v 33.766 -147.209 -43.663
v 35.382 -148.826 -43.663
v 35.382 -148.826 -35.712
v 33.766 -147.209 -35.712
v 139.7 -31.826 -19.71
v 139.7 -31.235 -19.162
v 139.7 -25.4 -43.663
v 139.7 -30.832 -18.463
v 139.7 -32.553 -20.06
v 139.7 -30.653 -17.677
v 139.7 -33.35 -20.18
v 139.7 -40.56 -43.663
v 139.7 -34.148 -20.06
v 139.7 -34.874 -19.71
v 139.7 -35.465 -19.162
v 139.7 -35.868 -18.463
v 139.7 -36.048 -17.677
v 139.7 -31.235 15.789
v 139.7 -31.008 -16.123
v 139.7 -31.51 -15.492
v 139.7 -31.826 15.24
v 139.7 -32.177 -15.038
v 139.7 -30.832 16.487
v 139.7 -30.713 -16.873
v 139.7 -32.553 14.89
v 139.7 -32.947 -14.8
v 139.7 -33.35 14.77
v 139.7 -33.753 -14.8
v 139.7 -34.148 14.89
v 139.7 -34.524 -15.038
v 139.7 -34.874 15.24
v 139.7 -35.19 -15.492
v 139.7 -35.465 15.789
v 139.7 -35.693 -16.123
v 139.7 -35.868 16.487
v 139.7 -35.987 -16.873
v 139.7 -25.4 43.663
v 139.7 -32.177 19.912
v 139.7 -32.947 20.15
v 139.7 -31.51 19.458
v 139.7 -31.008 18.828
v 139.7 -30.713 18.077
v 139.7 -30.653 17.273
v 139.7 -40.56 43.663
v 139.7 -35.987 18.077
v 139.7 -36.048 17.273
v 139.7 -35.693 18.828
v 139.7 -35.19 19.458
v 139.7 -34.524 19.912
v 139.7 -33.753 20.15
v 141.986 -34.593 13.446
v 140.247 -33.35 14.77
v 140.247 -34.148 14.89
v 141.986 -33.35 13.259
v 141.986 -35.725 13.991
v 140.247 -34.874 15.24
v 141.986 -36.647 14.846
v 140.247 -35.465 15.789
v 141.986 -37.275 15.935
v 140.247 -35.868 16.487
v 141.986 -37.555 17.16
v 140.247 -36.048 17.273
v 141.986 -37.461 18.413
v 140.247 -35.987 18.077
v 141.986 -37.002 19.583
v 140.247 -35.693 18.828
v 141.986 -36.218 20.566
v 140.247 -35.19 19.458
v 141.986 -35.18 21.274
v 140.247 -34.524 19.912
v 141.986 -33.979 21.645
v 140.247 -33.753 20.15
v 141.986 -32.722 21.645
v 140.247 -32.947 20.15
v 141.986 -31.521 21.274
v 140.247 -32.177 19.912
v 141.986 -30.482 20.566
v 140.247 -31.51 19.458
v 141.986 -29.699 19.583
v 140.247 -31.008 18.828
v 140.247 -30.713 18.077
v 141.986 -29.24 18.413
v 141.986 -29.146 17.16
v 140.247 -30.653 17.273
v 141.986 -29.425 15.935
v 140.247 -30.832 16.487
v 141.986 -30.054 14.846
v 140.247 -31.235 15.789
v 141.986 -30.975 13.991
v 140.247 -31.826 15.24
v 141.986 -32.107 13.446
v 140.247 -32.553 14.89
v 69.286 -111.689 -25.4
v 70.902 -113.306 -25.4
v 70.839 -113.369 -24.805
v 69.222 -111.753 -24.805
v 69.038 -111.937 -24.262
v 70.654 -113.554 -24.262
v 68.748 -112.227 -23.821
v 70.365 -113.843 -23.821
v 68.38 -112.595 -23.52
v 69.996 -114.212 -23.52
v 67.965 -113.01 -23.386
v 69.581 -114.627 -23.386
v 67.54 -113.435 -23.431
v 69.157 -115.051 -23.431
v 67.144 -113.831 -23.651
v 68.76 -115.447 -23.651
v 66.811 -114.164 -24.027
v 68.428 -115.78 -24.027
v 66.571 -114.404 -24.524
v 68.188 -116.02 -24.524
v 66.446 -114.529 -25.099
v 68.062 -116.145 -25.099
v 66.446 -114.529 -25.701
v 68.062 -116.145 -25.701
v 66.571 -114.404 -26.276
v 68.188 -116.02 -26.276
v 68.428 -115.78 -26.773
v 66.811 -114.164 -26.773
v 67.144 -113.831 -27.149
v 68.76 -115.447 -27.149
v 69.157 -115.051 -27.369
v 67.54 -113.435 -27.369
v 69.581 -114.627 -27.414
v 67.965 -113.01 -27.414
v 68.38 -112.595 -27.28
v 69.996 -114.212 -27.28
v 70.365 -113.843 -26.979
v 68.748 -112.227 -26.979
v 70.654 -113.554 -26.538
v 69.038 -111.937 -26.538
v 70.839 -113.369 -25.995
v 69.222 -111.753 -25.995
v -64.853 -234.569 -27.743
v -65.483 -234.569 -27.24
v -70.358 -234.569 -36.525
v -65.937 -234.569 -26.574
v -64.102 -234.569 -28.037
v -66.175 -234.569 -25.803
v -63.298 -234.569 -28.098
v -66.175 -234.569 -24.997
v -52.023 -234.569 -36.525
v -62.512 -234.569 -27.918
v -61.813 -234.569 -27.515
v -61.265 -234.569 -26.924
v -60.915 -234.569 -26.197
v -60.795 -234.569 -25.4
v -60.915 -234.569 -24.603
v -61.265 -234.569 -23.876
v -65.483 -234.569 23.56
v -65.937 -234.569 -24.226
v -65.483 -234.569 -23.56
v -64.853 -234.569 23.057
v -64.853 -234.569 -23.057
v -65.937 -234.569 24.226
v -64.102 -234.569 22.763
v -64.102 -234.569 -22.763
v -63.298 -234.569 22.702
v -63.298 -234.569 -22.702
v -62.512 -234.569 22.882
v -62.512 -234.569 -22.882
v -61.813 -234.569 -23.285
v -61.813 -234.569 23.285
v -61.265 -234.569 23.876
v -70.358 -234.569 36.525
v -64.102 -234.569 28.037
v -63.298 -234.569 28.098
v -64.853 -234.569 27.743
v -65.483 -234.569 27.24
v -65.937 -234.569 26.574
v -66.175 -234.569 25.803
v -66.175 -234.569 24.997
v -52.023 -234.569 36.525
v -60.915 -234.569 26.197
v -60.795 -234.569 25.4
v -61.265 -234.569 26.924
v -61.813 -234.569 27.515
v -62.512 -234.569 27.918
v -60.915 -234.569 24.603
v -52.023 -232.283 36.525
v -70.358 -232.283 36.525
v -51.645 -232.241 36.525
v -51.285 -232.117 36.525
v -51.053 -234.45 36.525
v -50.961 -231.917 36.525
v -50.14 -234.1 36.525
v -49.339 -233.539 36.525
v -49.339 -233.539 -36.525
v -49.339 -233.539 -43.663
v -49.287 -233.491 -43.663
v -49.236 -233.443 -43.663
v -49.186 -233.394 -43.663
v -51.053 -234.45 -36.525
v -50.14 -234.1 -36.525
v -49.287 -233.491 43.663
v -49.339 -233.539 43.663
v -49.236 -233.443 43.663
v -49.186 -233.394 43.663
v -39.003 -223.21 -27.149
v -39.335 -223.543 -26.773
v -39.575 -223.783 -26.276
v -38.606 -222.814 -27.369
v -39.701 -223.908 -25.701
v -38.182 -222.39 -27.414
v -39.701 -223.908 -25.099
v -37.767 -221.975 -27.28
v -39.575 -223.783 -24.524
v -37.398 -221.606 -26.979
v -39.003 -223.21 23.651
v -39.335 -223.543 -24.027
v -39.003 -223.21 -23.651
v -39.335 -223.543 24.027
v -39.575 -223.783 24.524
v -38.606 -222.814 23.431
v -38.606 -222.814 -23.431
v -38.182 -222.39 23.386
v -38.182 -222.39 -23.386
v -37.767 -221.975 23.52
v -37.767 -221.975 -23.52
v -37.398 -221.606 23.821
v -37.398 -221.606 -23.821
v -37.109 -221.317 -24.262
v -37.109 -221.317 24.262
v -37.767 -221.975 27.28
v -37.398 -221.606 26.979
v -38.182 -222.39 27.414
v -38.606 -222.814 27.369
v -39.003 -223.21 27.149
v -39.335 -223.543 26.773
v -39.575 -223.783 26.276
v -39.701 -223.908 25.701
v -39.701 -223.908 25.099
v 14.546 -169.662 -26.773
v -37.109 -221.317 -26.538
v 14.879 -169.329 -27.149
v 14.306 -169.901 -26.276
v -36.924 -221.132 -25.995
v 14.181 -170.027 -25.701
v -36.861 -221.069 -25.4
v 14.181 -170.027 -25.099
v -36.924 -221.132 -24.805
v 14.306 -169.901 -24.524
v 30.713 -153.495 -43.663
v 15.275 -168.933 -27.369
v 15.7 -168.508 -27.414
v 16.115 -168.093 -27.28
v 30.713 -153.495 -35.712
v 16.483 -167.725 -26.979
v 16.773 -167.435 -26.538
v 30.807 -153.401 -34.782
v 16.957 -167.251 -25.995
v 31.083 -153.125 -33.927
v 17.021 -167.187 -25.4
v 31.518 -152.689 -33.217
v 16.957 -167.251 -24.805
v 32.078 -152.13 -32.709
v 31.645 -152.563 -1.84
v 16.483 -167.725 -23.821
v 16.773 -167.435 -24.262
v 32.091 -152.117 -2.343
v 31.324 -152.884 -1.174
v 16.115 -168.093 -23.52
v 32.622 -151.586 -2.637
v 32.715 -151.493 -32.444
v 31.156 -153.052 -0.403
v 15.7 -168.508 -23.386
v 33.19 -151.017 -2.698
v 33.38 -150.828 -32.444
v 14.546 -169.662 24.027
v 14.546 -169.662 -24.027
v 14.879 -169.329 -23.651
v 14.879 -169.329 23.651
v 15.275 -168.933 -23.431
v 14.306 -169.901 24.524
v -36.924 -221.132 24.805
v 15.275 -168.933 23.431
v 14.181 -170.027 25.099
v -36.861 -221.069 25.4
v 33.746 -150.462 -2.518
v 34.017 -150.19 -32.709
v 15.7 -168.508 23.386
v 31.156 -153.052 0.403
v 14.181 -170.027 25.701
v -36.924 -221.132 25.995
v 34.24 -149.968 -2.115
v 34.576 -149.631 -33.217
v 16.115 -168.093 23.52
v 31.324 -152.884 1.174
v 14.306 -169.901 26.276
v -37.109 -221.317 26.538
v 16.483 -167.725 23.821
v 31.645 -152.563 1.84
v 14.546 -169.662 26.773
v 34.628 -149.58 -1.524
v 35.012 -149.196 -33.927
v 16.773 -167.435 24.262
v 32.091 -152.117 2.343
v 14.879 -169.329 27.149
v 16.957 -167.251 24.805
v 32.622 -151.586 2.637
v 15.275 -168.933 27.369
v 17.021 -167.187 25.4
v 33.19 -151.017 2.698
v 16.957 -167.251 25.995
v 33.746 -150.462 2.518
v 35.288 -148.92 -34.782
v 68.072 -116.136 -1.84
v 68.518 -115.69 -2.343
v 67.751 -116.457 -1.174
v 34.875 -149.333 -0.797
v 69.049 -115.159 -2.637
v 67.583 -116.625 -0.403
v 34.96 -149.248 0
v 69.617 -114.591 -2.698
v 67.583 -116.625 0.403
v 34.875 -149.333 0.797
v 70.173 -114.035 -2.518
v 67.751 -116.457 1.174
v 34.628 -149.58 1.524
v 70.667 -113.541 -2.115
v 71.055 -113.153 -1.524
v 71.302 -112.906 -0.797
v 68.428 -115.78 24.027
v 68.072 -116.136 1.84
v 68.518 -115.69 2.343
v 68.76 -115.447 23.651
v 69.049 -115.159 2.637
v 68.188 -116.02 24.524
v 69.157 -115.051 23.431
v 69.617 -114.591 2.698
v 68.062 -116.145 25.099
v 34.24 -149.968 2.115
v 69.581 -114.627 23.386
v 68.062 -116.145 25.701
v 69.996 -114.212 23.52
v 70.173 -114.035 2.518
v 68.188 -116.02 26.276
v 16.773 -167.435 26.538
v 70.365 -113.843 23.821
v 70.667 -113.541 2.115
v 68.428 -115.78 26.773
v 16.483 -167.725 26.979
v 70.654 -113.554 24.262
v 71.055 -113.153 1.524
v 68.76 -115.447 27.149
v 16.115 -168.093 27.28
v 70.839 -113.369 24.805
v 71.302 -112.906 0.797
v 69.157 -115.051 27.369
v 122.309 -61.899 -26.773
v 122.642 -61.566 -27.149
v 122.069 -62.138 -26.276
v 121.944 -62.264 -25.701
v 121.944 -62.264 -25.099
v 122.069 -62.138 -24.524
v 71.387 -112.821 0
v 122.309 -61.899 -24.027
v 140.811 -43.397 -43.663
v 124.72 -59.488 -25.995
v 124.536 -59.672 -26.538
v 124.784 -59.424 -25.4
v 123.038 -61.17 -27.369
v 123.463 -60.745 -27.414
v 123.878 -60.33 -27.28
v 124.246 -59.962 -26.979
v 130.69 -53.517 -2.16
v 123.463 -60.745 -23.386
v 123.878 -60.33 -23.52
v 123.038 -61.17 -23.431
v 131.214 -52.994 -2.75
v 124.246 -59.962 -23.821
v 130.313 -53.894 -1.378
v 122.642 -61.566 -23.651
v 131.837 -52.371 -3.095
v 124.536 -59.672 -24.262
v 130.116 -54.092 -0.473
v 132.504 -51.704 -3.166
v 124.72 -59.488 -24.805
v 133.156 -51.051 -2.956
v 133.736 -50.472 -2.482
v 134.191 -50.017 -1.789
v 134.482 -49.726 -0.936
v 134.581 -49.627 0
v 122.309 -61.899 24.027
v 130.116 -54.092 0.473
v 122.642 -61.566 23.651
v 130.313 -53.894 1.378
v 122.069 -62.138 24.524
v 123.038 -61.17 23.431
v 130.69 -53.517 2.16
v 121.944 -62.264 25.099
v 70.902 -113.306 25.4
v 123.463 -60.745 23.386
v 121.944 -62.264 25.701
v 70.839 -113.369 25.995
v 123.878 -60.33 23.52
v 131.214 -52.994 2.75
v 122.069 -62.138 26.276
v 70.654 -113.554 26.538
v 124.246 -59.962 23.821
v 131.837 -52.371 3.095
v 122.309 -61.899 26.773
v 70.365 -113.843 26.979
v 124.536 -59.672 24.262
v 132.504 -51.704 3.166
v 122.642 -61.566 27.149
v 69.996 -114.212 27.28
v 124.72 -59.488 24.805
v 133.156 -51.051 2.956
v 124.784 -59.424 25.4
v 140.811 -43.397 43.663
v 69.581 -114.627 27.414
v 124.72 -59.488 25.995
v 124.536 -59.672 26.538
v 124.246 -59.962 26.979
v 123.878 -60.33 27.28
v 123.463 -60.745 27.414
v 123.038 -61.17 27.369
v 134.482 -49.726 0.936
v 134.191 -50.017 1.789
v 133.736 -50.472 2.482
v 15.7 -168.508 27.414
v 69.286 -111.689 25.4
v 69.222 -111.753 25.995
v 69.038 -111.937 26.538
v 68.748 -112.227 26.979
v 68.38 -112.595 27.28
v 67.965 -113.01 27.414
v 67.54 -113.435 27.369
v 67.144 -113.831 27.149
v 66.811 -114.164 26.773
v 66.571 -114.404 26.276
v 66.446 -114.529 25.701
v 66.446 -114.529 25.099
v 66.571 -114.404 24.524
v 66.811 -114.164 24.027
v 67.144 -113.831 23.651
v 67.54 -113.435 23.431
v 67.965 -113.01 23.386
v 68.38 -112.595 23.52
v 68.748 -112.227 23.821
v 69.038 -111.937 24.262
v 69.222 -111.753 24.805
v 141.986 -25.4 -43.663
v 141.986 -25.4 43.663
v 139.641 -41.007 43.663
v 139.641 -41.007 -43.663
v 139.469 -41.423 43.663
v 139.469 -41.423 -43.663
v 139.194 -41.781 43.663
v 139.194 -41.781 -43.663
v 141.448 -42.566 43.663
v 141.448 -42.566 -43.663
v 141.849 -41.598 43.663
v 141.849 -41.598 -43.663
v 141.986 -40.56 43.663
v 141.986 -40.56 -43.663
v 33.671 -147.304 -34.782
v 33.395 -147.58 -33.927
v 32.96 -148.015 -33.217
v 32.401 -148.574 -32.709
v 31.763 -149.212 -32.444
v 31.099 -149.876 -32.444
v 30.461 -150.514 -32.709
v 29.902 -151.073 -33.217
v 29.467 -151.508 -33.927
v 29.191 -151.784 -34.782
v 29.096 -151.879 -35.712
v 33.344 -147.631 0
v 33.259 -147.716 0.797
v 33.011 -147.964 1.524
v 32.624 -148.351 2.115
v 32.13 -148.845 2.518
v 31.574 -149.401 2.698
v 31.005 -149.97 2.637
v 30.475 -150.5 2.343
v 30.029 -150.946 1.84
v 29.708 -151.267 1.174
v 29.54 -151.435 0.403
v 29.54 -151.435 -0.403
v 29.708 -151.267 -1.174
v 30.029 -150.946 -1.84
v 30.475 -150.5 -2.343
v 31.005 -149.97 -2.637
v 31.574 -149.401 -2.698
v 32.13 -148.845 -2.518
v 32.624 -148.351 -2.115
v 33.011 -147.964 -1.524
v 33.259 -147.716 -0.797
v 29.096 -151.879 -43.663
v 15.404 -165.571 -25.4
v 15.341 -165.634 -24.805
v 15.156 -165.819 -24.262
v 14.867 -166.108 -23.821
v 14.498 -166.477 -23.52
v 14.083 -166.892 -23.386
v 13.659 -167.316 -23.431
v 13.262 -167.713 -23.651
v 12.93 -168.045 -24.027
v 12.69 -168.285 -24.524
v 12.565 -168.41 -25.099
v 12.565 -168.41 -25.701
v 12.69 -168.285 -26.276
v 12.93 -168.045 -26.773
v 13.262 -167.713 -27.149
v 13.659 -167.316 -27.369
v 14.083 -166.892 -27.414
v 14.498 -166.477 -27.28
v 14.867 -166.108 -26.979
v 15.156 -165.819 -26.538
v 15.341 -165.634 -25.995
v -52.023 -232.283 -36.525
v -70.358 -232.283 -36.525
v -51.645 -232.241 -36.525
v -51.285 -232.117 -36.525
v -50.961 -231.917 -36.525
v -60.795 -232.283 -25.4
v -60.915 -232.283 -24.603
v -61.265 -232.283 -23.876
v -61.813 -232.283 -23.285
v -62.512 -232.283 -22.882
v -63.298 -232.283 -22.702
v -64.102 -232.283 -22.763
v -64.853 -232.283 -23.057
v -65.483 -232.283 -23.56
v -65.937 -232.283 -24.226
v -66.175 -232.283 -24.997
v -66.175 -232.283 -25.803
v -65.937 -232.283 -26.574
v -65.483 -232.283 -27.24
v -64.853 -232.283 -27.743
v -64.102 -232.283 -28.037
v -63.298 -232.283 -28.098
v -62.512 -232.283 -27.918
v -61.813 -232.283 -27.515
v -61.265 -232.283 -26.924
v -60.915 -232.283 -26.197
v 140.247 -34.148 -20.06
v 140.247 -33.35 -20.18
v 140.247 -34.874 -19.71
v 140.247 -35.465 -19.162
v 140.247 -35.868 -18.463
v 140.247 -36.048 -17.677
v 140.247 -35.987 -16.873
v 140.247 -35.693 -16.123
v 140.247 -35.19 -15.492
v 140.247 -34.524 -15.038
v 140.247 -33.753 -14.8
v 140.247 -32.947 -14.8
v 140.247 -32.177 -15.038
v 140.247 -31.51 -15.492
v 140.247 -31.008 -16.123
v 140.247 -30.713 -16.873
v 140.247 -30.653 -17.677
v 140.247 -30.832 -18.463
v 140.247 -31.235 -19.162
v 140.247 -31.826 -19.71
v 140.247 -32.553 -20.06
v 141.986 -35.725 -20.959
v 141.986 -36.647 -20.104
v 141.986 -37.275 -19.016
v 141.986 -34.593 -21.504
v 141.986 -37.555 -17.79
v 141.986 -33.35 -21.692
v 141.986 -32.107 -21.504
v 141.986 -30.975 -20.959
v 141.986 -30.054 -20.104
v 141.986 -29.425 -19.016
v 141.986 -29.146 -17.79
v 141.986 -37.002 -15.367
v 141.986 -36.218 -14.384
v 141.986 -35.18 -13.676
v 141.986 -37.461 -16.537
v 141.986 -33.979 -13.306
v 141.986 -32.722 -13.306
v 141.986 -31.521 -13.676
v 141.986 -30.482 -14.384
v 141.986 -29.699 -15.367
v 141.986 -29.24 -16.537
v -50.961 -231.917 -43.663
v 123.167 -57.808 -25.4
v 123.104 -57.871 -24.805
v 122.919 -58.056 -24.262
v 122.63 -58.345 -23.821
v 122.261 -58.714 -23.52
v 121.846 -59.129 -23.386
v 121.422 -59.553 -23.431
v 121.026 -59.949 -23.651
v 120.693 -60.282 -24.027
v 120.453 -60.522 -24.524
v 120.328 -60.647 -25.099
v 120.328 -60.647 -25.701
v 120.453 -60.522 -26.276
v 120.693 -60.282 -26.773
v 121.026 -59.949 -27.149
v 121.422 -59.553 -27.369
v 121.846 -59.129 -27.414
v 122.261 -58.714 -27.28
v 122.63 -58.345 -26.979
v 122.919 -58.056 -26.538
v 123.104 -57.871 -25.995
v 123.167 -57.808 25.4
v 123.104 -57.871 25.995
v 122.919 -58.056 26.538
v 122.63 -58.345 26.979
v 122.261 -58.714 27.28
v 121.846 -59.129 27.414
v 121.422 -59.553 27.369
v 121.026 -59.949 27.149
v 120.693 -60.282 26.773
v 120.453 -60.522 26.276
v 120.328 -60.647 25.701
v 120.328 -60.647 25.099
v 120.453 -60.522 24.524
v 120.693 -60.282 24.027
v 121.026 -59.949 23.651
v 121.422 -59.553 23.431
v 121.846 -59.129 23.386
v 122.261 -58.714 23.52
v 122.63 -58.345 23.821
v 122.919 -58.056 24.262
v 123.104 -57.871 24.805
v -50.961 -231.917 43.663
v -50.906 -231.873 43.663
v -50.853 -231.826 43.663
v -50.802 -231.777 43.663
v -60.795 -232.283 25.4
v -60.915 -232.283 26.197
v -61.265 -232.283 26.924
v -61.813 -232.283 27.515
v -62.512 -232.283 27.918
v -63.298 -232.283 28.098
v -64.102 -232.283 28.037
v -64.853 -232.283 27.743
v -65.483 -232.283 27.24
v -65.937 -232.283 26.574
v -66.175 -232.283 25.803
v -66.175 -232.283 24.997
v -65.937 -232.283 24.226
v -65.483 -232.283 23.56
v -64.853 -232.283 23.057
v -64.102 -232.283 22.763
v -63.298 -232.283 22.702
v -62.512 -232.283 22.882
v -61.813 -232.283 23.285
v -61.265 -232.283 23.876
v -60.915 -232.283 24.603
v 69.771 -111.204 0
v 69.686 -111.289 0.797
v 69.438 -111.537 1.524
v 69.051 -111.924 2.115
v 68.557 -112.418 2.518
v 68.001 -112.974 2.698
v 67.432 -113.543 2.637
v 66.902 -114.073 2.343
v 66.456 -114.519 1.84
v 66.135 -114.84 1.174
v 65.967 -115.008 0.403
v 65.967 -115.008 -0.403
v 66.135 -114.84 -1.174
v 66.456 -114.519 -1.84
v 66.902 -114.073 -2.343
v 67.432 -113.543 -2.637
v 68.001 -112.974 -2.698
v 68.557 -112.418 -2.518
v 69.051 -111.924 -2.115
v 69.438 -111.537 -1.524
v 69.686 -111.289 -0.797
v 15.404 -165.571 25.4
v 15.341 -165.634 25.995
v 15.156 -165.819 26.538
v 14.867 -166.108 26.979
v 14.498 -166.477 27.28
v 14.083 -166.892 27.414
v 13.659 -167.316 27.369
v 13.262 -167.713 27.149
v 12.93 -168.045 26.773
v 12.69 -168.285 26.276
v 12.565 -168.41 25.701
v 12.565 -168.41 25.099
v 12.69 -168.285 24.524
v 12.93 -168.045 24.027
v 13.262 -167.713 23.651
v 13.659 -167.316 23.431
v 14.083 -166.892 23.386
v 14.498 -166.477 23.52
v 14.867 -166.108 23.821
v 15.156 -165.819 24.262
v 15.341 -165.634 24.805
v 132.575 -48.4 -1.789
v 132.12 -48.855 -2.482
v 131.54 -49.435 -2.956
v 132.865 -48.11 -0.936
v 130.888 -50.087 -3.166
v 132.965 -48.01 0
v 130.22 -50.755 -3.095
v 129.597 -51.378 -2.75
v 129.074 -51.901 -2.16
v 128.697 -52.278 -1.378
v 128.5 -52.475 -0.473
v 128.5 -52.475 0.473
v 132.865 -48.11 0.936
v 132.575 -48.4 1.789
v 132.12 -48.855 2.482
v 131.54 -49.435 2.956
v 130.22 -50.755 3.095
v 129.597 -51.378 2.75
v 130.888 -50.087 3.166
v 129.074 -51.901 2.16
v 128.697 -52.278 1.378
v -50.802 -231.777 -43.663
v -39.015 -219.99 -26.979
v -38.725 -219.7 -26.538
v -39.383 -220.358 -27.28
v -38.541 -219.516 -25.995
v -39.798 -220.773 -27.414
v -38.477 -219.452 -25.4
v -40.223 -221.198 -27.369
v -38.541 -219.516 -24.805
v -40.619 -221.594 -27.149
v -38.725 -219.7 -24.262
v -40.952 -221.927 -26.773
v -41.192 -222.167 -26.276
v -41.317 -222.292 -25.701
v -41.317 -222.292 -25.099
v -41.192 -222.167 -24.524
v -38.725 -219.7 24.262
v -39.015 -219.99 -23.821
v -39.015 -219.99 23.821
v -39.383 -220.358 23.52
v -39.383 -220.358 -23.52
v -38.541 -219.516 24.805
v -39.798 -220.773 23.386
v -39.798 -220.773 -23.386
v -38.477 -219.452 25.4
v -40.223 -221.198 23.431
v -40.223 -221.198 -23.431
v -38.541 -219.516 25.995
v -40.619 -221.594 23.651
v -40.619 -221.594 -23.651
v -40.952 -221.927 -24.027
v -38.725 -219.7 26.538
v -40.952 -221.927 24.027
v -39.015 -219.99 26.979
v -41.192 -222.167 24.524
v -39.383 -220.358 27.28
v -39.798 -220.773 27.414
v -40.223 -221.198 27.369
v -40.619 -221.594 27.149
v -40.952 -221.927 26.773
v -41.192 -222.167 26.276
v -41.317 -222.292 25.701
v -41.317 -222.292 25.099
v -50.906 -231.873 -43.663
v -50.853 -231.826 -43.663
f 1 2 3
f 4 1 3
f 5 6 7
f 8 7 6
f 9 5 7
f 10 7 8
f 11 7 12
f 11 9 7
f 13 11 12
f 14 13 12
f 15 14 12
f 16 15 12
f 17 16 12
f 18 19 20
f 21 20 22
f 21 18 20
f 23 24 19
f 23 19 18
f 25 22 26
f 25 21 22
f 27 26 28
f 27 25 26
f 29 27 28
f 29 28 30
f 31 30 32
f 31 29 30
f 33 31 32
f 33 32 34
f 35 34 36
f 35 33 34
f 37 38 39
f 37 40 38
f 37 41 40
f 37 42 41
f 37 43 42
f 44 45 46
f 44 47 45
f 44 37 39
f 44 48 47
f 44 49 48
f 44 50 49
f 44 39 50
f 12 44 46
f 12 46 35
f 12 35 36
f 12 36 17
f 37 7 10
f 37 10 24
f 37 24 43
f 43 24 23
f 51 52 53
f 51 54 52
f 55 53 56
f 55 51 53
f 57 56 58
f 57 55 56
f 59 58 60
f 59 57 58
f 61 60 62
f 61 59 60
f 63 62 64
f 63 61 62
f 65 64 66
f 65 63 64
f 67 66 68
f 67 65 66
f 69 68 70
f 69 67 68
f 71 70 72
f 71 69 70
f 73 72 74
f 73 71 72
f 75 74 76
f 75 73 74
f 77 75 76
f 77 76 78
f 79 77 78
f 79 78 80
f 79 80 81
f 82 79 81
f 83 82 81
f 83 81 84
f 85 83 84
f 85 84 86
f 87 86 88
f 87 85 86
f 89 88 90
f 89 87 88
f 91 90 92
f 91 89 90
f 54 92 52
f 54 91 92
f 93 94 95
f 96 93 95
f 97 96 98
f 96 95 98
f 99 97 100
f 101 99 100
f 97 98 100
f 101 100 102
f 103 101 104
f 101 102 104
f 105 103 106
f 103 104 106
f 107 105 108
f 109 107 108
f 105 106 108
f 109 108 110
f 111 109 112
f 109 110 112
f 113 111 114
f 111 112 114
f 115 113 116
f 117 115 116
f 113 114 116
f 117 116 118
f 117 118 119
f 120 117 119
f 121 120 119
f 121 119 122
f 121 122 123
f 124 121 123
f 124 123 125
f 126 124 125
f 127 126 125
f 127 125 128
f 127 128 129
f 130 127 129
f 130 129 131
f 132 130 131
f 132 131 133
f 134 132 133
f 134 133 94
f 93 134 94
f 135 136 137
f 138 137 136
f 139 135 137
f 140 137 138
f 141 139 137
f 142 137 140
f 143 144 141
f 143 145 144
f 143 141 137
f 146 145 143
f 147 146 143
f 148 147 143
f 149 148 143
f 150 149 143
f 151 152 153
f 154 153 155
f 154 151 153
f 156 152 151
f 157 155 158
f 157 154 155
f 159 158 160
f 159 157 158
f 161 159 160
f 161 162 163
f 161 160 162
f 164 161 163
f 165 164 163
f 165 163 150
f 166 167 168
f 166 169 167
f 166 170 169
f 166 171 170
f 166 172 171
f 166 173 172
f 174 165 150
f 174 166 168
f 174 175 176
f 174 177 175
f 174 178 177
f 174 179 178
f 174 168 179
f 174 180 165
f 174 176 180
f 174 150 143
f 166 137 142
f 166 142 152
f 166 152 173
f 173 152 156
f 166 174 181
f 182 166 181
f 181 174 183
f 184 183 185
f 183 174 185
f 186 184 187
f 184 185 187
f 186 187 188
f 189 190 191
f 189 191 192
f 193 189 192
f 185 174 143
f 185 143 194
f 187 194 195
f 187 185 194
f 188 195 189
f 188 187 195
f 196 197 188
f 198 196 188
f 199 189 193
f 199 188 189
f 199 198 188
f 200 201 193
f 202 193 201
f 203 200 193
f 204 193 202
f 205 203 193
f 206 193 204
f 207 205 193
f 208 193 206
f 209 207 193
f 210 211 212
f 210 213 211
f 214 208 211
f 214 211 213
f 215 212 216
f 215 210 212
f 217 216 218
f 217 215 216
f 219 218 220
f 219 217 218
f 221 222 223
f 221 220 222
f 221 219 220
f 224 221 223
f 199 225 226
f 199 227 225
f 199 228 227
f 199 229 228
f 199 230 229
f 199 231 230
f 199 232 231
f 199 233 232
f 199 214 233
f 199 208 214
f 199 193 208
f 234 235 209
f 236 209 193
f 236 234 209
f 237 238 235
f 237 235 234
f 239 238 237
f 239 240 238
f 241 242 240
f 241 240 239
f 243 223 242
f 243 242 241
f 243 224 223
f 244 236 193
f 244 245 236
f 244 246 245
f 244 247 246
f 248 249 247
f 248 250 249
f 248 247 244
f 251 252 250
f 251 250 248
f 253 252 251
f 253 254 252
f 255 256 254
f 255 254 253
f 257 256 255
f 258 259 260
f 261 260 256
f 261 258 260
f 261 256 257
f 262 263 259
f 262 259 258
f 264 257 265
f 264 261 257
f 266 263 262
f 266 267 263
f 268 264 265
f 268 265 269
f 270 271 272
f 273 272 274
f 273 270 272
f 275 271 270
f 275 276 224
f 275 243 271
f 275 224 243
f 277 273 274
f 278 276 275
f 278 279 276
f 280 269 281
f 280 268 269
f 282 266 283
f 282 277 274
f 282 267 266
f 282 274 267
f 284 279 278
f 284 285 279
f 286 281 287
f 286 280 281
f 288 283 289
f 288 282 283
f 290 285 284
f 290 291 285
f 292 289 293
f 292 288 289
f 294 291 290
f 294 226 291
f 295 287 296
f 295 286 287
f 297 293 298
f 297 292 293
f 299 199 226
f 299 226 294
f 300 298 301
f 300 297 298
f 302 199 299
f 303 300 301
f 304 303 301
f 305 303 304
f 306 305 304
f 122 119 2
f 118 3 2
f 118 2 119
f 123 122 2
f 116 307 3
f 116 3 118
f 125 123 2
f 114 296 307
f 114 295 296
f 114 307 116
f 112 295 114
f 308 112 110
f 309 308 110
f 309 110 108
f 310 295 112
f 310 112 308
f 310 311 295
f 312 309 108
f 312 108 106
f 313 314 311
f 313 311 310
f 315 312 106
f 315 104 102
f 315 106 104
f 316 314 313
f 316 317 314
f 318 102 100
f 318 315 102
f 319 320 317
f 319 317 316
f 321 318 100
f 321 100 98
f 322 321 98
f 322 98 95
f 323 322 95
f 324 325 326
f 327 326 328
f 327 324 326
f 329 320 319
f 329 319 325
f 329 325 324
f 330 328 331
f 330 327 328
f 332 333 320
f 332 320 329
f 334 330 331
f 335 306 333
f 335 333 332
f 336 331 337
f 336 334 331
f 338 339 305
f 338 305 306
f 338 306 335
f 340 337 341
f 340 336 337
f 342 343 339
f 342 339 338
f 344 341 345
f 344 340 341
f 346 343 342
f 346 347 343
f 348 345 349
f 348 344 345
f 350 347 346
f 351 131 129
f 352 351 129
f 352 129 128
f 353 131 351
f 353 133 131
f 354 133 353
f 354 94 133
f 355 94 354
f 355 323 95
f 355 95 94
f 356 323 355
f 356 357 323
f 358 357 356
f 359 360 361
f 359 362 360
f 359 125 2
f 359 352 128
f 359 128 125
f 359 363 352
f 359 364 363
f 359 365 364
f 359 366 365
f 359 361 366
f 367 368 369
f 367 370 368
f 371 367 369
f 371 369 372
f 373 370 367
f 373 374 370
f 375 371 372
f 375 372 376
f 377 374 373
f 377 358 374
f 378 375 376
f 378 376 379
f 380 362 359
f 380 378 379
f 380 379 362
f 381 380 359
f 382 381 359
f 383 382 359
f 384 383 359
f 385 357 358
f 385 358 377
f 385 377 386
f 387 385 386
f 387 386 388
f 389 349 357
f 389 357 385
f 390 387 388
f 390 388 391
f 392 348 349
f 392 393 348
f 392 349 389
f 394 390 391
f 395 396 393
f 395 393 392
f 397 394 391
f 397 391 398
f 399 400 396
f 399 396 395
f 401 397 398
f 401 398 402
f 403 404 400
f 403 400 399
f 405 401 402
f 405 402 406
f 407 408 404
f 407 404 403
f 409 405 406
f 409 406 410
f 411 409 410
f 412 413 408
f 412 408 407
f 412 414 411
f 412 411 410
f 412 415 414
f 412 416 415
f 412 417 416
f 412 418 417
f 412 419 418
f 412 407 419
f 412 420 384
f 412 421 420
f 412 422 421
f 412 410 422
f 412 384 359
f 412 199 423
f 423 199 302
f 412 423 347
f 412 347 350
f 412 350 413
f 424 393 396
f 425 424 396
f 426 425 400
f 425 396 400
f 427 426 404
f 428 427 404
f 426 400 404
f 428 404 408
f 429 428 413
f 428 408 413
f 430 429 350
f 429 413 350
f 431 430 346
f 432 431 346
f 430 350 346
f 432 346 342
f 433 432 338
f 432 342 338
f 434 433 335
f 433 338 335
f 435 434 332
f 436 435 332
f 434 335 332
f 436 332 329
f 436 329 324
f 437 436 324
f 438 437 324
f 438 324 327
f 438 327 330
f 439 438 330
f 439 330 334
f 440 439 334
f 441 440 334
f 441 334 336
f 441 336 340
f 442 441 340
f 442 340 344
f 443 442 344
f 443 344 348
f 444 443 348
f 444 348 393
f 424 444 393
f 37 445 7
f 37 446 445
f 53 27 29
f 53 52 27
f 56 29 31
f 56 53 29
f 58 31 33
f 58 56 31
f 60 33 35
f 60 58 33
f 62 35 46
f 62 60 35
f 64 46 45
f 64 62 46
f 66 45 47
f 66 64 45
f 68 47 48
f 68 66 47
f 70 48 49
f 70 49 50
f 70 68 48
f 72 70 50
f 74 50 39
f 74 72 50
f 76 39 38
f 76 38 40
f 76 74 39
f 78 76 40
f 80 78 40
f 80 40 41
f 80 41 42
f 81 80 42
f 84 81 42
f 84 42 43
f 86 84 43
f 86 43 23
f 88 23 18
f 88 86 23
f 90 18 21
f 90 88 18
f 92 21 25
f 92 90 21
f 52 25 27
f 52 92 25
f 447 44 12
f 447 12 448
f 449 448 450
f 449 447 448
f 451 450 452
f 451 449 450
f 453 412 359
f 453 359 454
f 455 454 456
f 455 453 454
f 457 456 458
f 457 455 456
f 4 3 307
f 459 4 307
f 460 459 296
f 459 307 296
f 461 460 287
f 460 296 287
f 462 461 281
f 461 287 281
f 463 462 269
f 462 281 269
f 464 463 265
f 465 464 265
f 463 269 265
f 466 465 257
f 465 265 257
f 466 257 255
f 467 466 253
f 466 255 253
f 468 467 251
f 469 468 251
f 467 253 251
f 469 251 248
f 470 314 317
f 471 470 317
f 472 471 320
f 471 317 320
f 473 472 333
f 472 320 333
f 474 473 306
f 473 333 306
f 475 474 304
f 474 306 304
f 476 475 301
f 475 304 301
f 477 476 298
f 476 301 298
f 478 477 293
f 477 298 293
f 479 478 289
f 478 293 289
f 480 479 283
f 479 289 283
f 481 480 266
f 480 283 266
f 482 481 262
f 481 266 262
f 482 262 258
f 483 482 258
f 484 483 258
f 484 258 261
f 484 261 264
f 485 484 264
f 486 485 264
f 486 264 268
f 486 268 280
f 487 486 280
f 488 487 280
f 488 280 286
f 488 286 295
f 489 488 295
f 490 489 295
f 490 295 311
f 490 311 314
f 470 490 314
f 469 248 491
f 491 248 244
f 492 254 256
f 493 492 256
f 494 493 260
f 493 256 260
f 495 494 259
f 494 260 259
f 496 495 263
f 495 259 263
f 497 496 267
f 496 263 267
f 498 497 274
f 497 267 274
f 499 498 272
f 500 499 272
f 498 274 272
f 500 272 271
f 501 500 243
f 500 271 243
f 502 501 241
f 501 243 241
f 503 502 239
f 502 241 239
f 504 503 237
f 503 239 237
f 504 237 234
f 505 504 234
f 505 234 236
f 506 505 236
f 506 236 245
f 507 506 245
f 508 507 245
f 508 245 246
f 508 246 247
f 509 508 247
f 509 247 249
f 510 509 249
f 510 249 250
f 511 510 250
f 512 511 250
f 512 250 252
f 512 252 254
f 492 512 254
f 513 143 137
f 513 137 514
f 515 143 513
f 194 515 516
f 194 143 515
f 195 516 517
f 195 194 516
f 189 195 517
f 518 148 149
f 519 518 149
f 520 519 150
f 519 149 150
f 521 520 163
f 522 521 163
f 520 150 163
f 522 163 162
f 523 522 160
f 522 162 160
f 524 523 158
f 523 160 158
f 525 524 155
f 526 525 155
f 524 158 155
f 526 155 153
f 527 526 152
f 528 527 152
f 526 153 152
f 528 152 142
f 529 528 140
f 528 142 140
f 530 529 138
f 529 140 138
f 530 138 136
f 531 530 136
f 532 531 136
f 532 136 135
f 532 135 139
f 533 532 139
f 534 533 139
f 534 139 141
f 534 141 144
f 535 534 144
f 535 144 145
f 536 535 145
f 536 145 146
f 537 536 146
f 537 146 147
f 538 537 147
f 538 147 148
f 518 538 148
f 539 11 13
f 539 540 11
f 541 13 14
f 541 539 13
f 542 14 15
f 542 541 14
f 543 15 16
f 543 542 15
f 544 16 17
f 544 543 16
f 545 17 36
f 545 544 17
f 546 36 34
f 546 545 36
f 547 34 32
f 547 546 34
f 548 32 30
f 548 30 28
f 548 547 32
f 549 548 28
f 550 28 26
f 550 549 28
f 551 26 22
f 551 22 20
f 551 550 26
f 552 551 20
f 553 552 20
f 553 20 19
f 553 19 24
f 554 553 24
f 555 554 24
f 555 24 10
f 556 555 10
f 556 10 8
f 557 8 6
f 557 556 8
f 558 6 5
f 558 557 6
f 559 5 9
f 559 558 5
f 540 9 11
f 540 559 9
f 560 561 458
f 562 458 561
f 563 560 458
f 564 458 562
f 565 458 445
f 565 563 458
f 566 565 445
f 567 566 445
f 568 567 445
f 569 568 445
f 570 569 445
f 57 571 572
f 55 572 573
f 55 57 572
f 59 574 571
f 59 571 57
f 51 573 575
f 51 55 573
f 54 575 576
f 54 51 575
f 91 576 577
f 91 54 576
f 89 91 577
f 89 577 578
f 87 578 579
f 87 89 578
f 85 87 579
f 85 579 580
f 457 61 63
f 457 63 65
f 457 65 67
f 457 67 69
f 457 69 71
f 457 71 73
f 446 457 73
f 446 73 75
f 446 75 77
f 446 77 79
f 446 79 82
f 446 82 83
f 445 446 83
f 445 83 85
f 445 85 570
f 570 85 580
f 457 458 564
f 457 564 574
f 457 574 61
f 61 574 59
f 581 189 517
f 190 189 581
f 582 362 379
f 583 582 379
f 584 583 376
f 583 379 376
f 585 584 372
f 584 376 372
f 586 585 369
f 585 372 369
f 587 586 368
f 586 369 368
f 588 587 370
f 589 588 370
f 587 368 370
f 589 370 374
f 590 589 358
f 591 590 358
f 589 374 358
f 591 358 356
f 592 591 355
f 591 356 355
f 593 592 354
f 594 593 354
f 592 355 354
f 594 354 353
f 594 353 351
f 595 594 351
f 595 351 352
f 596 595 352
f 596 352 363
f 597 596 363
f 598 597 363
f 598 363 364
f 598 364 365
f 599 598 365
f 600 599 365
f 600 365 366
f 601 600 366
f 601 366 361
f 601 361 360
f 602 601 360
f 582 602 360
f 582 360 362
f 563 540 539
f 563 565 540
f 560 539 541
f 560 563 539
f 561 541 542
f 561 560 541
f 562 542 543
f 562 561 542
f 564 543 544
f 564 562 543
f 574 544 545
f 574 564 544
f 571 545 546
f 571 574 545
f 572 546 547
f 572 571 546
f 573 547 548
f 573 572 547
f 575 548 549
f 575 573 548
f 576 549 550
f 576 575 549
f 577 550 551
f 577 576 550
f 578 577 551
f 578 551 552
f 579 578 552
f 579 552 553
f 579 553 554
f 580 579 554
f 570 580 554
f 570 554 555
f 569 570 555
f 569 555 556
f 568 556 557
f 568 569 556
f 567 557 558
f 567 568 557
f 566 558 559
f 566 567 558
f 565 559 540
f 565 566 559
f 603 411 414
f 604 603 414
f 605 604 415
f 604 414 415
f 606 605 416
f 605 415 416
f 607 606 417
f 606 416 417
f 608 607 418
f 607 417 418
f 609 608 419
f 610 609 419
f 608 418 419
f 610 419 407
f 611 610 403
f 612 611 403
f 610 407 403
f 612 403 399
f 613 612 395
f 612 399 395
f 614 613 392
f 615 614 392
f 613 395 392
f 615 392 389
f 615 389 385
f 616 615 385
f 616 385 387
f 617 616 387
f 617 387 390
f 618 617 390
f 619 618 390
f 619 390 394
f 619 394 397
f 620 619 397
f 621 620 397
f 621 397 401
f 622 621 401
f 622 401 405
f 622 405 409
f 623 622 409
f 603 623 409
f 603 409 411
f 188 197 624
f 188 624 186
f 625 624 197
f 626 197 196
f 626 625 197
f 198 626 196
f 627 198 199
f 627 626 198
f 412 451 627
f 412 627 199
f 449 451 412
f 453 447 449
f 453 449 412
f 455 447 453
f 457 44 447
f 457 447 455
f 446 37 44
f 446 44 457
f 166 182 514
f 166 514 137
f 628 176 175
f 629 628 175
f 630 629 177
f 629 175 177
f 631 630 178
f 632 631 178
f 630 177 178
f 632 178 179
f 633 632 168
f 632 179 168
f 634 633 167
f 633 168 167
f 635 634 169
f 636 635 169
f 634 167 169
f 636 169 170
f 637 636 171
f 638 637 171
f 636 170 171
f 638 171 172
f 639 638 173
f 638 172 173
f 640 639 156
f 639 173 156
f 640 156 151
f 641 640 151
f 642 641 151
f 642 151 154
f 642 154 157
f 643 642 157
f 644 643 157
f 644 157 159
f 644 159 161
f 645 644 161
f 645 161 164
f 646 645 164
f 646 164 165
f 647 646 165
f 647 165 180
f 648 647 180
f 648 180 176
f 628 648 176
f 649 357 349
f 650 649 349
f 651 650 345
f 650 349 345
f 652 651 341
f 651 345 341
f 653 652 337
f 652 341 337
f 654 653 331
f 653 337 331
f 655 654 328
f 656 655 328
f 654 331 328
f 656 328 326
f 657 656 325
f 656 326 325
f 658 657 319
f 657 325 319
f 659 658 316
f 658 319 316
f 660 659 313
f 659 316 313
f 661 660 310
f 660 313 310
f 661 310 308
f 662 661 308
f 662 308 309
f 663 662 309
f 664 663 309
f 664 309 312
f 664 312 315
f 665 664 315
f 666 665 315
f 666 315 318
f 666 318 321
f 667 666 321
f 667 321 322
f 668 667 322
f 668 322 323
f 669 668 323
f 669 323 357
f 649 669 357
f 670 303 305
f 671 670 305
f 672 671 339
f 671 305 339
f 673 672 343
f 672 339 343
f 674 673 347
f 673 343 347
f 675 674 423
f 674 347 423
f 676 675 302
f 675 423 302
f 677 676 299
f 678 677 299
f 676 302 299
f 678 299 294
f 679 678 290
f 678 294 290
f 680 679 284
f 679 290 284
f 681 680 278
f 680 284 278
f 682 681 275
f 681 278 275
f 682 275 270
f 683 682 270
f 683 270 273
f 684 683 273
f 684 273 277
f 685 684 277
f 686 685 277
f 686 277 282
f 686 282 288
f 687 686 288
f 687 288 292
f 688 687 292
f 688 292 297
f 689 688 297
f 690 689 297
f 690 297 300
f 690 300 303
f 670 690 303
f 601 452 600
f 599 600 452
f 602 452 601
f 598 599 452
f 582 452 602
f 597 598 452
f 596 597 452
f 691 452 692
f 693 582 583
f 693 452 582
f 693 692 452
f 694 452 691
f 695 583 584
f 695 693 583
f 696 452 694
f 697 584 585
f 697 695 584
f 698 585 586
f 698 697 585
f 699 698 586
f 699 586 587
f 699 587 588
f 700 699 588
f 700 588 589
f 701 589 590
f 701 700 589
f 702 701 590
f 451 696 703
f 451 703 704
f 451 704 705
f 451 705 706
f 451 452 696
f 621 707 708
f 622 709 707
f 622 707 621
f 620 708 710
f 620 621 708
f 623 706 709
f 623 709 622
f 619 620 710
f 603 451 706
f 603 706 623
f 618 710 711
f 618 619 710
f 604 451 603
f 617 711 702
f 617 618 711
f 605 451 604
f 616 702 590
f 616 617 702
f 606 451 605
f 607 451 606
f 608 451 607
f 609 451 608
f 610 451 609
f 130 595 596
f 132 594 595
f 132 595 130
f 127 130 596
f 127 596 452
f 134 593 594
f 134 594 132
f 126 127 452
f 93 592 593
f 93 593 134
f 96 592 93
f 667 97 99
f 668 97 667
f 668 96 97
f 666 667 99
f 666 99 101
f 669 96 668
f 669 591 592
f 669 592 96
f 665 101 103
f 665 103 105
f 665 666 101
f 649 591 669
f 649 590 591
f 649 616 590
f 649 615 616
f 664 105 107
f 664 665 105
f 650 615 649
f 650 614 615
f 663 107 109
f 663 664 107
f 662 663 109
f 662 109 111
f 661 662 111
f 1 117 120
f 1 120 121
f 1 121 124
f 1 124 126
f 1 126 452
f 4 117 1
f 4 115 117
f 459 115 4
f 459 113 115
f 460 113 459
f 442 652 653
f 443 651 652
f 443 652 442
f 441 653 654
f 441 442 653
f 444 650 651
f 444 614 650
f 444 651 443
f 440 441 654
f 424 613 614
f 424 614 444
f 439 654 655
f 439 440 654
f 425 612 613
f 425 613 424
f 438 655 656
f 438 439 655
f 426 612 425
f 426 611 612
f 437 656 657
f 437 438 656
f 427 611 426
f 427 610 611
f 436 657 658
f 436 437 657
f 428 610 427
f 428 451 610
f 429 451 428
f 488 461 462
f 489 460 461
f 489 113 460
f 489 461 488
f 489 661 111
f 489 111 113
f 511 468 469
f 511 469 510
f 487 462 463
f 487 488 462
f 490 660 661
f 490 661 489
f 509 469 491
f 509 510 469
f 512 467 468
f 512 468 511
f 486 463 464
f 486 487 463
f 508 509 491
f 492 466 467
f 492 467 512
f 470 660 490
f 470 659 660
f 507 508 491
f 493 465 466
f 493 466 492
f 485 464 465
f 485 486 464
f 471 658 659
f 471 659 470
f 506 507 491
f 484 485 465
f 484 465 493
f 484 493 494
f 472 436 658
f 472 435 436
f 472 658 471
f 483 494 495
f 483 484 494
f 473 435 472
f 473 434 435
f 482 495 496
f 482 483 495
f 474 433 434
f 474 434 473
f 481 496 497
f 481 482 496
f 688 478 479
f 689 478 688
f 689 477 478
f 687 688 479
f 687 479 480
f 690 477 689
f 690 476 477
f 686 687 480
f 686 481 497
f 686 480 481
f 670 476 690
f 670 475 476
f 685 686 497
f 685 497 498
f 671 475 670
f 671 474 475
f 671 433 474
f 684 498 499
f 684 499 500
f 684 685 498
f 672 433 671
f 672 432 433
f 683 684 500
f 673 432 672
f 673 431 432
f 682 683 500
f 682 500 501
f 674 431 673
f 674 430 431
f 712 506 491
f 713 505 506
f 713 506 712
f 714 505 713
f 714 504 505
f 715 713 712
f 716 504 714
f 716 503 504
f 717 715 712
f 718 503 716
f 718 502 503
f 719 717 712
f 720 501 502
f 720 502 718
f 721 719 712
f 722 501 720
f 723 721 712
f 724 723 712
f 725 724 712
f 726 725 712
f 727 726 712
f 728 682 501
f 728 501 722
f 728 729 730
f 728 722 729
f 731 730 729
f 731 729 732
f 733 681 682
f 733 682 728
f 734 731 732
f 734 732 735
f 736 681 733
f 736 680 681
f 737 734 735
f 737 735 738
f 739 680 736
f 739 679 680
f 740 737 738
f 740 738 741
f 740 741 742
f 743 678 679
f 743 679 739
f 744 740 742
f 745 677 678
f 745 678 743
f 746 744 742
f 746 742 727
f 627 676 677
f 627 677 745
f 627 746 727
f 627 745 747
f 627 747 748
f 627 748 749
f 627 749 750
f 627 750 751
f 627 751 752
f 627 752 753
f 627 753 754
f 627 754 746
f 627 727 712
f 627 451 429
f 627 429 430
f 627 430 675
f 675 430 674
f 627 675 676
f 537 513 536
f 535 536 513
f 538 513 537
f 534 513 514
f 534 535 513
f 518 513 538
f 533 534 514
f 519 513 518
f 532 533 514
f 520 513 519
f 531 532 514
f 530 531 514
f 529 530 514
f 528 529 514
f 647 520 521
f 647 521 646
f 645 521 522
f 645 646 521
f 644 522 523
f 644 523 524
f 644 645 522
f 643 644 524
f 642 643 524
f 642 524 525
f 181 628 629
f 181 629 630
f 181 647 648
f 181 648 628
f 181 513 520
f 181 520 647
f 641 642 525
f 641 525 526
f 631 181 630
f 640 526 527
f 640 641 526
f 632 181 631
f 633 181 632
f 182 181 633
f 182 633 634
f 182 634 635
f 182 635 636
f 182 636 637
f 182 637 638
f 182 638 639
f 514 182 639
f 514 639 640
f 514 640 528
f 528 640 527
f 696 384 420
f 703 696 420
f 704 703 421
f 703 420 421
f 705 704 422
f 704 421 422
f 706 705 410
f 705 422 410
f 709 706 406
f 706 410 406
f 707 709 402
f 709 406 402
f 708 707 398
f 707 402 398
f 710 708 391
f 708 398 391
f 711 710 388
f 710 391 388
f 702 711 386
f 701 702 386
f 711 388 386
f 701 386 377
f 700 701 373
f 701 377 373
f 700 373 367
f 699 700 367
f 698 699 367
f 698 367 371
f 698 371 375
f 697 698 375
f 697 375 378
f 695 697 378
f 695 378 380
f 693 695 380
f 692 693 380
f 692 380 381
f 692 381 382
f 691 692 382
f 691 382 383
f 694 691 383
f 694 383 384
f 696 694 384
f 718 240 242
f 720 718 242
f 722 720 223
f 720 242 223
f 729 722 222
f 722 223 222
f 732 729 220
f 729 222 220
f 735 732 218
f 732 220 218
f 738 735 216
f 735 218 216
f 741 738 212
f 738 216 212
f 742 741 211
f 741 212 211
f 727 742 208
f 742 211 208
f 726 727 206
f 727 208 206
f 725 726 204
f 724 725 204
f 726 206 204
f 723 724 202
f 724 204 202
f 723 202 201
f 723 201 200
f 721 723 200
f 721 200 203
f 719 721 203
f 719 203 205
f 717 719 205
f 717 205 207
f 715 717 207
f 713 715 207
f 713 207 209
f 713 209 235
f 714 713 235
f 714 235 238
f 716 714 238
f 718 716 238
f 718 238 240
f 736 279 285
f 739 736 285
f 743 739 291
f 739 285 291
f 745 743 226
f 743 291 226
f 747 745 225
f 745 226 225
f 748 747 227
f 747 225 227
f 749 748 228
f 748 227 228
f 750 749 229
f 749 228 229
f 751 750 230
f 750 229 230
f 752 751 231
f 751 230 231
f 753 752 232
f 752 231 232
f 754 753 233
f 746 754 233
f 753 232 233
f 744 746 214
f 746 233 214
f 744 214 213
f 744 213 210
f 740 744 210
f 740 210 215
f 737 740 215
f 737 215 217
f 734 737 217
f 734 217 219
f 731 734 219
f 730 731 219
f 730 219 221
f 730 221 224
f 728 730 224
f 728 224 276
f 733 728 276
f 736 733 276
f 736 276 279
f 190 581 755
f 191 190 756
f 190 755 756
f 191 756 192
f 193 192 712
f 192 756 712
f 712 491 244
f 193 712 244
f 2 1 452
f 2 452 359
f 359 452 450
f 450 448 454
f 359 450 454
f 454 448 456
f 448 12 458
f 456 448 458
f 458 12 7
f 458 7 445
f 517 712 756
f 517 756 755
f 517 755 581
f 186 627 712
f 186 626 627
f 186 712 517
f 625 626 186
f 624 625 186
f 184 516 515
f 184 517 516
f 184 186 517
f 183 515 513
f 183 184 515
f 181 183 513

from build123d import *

# Parameters (mm, degrees)
BASE_FLANGE1_DEPTH                            = 43.6626
SKETCH3_W                                     = 39.3553177
SKETCH3_H                                     = 59.329005091
CUT_EXTRUDE1_DEPTH                            = 221.446361168
CSK_FOR_8_FLAT_HEAD_MACHINE_SCREW1_AT_2_COUNT = 2
CSK_FOR_8_FLAT_HEAD_MACHINE_SCREW1_AT_2_PITCH = 34.9504
SKETCH6_R                                     = 3.175
SKETCH6_R_2                                   = 2.0193
SKETCH6_R_3                                   = 2.7051
CUT_EXTRUDE2_DEPTH                            = 7.62
CUT_EXTRUDE3_REACH                            = 258.55
SKETCH7_R                                     = 2.7051
CE_00_NOTCH_FOR_WIRE_REACH                    = 222.446


# Sheet-metal steps are written as plain solids
with BuildPart() as part:
    # Sketch1 → Base-Flange1 (new, symmetric)
    with BuildSketch(Plane.XY):
        with BuildLine():
            Line((139.7, -25.4), (139.7, -40.559570335))
            ThreePointArc((139.7, -40.559570335), (139.568524729, -41.220541159), (139.194114832, -41.780885168))
            Line((139.194114832, -41.780885168), (-50.802114832, -231.777114832))
            ThreePointArc((-50.802114832, -231.777114832), (-51.362458841, -232.151524729), (-52.023429665, -232.283))
            Line((-52.023429665, -232.283), (-70.358, -232.283))
            Line((-70.358, -232.283), (-70.358, -234.569))
            Line((-70.358, -234.569), (-52.023429665, -234.569))
            ThreePointArc((-52.023429665, -234.569), (-50.487644514, -234.26351334), (-49.185668731, -233.393560934))
            Line((-49.185668731, -233.393560934), (140.810560934, -43.397331269))
            ThreePointArc((140.810560934, -43.397331269), (141.68051334, -42.095355486), (141.986, -40.559570335))
            Line((141.986, -40.559570335), (141.986, -25.4))
            Line((141.986, -25.4), (139.7, -25.4))
        make_face()
    extrude(amount=BASE_FLANGE1_DEPTH, both=True)

    # Sketch3 → Cut-Extrude1 (cut, through all)
    with BuildSketch(Plane(origin=(92.103946102, -92.103946102, 0), x_dir=(0, 0, -1), z_dir=(0.7071067811865464, -0.7071067811865487, 0))):
        with Locations((-56.20285885, -229.689502546)):
            Rectangle(SKETCH3_W, SKETCH3_H)
        with Locations((56.20285885, -229.689502546)):
            Rectangle(SKETCH3_W, SKETCH3_H)
    extrude(amount=-CUT_EXTRUDE1_DEPTH, mode=Mode.SUBTRACT)

    # Sketch4 → CSK for #8 Flat Head Machine Screw1 (revolve, cut)
    with BuildSketch(Plane(origin=(141.986, -33.3502, -17.4752), x_dir=(0, 0, -1), z_dir=(0, 1, 0))):
        Polygon((0, 0), (0, 2.286), (2.7051, 2.286), (2.7051, 1.738551774), (4.2164, 0), align=None)
    csk_for_8_flat_head_machine_screw1 = revolve(axis=Axis((148.336, -33.3502, -17.4752), (-1, 0, 0)), mode=Mode.SUBTRACT)

    # CSK for #8 Flat Head Machine Screw1 at 2: CSK for #8 Flat Head Machine Screw1 ×2
    with Locations(*[(0, 0, i * CSK_FOR_8_FLAT_HEAD_MACHINE_SCREW1_AT_2_PITCH) for i in range(1, CSK_FOR_8_FLAT_HEAD_MACHINE_SCREW1_AT_2_COUNT)]):
        add(csk_for_8_flat_head_machine_screw1, mode=Mode.SUBTRACT)

    # Sketch6 → Cut-Extrude2 (cut)
    with BuildSketch(Plane(origin=(92.103946102, -92.103946102, 0), x_dir=(0, 0, -1), z_dir=(0.7071067811865465, -0.7071067811865486, 0))):
        with Locations(Location((0, 56.896984938, 0), (0, 0, 90))):
            Circle(SKETCH6_R)
        with Locations(Location((25.4, 44.196984938, 0), (0, 0, 90))):
            Circle(SKETCH6_R_2)
        with Locations(Location((25.4, -32.003015062, 0), (0, 0, 90))):
            Circle(SKETCH6_R_2)
        with Locations(Location((25.4, -108.203015062, 0), (0, 0, 90))):
            Circle(SKETCH6_R_2)
        with Locations(Location((-25.4, -108.203015062, 0), (0, 0, 90))):
            Circle(SKETCH6_R_2)
        with Locations(Location((-25.4, -32.003015062, 0), (0, 0, 90))):
            Circle(SKETCH6_R_2)
        with Locations(Location((-25.4, 44.196984938, 0), (0, 0, 90))):
            Circle(SKETCH6_R_2)
        with Locations(Location((0, -32.003015062, 0), (0, 0, 90))):
            Circle(SKETCH6_R_3)
        with Locations(Location((25.4, -184.403015062, 0), (0, 0, 90))):
            Circle(SKETCH6_R_2)
        with Locations(Location((-25.4, -184.403015062, 0), (0, 0, 90))):
            Circle(SKETCH6_R_2)
        with Locations(Location((0, -83.518444727, 0), (0, 0, 90))):
            Circle(SKETCH6_R_3)
    extrude(amount=-CUT_EXTRUDE2_DEPTH, mode=Mode.SUBTRACT)

    # Sketch7 → Cut-Extrude3 (cut, up to next)
    with BuildSketch(Plane.XZ.offset(234.569), mode=Mode.PRIVATE) as cut_extrude3_sk1:
        with Locations((-63.5, 25.4)):
            Circle(SKETCH7_R)
    cut_extrude3_tool1 = extrude(cut_extrude3_sk1.sketch, amount=-CUT_EXTRUDE3_REACH, mode=Mode.PRIVATE) & part.part
    # Sketch7 → Cut-Extrude3 (cut, up to next)
    with BuildSketch(Plane.XZ.offset(234.569), mode=Mode.PRIVATE) as cut_extrude3_sk2:
        with Locations((-63.5, -25.4)):
            Circle(SKETCH7_R)
    cut_extrude3_tool2 = extrude(cut_extrude3_sk2.sketch, amount=-CUT_EXTRUDE3_REACH, mode=Mode.PRIVATE) & part.part
    add(cut_extrude3_tool1.solids().sort_by_distance((-63.5, -234.569, 25.4))[0], mode=Mode.SUBTRACT)
    add(cut_extrude3_tool2.solids().sort_by_distance((-63.5, -234.569, -25.4))[0], mode=Mode.SUBTRACT)

    # Sketch8 → CE-00 Notch for Wire (cut, up to next)
    with BuildSketch(Plane(origin=(92.103946102, -92.103946102, 0), x_dir=(0, 0, -1), z_dir=(0.7071067811865465, -0.7071067811865486, 0)), mode=Mode.PRIVATE) as ce_00_notch_for_wire_sk1:
        with BuildLine():
            Line((64.632412862, -80.216444727), (35.7124, -80.216444727))
            ThreePointArc((35.7124, -80.216444727), (32.4104, -83.518444727), (35.7124, -86.820444727))
            Line((35.7124, -86.820444727), (64.632412862, -86.820444727))
            Line((64.632412862, -86.820444727), (64.632412862, -80.216444727))
        make_face()
    ce_00_notch_for_wire_tool1 = extrude(ce_00_notch_for_wire_sk1.sketch, amount=-CE_00_NOTCH_FOR_WIRE_REACH, mode=Mode.PRIVATE) & part.part
    add(ce_00_notch_for_wire_tool1.solids().sort_by_distance((33.047487, -151.160405, -48.867096))[0], mode=Mode.SUBTRACT)


solid = part.part
